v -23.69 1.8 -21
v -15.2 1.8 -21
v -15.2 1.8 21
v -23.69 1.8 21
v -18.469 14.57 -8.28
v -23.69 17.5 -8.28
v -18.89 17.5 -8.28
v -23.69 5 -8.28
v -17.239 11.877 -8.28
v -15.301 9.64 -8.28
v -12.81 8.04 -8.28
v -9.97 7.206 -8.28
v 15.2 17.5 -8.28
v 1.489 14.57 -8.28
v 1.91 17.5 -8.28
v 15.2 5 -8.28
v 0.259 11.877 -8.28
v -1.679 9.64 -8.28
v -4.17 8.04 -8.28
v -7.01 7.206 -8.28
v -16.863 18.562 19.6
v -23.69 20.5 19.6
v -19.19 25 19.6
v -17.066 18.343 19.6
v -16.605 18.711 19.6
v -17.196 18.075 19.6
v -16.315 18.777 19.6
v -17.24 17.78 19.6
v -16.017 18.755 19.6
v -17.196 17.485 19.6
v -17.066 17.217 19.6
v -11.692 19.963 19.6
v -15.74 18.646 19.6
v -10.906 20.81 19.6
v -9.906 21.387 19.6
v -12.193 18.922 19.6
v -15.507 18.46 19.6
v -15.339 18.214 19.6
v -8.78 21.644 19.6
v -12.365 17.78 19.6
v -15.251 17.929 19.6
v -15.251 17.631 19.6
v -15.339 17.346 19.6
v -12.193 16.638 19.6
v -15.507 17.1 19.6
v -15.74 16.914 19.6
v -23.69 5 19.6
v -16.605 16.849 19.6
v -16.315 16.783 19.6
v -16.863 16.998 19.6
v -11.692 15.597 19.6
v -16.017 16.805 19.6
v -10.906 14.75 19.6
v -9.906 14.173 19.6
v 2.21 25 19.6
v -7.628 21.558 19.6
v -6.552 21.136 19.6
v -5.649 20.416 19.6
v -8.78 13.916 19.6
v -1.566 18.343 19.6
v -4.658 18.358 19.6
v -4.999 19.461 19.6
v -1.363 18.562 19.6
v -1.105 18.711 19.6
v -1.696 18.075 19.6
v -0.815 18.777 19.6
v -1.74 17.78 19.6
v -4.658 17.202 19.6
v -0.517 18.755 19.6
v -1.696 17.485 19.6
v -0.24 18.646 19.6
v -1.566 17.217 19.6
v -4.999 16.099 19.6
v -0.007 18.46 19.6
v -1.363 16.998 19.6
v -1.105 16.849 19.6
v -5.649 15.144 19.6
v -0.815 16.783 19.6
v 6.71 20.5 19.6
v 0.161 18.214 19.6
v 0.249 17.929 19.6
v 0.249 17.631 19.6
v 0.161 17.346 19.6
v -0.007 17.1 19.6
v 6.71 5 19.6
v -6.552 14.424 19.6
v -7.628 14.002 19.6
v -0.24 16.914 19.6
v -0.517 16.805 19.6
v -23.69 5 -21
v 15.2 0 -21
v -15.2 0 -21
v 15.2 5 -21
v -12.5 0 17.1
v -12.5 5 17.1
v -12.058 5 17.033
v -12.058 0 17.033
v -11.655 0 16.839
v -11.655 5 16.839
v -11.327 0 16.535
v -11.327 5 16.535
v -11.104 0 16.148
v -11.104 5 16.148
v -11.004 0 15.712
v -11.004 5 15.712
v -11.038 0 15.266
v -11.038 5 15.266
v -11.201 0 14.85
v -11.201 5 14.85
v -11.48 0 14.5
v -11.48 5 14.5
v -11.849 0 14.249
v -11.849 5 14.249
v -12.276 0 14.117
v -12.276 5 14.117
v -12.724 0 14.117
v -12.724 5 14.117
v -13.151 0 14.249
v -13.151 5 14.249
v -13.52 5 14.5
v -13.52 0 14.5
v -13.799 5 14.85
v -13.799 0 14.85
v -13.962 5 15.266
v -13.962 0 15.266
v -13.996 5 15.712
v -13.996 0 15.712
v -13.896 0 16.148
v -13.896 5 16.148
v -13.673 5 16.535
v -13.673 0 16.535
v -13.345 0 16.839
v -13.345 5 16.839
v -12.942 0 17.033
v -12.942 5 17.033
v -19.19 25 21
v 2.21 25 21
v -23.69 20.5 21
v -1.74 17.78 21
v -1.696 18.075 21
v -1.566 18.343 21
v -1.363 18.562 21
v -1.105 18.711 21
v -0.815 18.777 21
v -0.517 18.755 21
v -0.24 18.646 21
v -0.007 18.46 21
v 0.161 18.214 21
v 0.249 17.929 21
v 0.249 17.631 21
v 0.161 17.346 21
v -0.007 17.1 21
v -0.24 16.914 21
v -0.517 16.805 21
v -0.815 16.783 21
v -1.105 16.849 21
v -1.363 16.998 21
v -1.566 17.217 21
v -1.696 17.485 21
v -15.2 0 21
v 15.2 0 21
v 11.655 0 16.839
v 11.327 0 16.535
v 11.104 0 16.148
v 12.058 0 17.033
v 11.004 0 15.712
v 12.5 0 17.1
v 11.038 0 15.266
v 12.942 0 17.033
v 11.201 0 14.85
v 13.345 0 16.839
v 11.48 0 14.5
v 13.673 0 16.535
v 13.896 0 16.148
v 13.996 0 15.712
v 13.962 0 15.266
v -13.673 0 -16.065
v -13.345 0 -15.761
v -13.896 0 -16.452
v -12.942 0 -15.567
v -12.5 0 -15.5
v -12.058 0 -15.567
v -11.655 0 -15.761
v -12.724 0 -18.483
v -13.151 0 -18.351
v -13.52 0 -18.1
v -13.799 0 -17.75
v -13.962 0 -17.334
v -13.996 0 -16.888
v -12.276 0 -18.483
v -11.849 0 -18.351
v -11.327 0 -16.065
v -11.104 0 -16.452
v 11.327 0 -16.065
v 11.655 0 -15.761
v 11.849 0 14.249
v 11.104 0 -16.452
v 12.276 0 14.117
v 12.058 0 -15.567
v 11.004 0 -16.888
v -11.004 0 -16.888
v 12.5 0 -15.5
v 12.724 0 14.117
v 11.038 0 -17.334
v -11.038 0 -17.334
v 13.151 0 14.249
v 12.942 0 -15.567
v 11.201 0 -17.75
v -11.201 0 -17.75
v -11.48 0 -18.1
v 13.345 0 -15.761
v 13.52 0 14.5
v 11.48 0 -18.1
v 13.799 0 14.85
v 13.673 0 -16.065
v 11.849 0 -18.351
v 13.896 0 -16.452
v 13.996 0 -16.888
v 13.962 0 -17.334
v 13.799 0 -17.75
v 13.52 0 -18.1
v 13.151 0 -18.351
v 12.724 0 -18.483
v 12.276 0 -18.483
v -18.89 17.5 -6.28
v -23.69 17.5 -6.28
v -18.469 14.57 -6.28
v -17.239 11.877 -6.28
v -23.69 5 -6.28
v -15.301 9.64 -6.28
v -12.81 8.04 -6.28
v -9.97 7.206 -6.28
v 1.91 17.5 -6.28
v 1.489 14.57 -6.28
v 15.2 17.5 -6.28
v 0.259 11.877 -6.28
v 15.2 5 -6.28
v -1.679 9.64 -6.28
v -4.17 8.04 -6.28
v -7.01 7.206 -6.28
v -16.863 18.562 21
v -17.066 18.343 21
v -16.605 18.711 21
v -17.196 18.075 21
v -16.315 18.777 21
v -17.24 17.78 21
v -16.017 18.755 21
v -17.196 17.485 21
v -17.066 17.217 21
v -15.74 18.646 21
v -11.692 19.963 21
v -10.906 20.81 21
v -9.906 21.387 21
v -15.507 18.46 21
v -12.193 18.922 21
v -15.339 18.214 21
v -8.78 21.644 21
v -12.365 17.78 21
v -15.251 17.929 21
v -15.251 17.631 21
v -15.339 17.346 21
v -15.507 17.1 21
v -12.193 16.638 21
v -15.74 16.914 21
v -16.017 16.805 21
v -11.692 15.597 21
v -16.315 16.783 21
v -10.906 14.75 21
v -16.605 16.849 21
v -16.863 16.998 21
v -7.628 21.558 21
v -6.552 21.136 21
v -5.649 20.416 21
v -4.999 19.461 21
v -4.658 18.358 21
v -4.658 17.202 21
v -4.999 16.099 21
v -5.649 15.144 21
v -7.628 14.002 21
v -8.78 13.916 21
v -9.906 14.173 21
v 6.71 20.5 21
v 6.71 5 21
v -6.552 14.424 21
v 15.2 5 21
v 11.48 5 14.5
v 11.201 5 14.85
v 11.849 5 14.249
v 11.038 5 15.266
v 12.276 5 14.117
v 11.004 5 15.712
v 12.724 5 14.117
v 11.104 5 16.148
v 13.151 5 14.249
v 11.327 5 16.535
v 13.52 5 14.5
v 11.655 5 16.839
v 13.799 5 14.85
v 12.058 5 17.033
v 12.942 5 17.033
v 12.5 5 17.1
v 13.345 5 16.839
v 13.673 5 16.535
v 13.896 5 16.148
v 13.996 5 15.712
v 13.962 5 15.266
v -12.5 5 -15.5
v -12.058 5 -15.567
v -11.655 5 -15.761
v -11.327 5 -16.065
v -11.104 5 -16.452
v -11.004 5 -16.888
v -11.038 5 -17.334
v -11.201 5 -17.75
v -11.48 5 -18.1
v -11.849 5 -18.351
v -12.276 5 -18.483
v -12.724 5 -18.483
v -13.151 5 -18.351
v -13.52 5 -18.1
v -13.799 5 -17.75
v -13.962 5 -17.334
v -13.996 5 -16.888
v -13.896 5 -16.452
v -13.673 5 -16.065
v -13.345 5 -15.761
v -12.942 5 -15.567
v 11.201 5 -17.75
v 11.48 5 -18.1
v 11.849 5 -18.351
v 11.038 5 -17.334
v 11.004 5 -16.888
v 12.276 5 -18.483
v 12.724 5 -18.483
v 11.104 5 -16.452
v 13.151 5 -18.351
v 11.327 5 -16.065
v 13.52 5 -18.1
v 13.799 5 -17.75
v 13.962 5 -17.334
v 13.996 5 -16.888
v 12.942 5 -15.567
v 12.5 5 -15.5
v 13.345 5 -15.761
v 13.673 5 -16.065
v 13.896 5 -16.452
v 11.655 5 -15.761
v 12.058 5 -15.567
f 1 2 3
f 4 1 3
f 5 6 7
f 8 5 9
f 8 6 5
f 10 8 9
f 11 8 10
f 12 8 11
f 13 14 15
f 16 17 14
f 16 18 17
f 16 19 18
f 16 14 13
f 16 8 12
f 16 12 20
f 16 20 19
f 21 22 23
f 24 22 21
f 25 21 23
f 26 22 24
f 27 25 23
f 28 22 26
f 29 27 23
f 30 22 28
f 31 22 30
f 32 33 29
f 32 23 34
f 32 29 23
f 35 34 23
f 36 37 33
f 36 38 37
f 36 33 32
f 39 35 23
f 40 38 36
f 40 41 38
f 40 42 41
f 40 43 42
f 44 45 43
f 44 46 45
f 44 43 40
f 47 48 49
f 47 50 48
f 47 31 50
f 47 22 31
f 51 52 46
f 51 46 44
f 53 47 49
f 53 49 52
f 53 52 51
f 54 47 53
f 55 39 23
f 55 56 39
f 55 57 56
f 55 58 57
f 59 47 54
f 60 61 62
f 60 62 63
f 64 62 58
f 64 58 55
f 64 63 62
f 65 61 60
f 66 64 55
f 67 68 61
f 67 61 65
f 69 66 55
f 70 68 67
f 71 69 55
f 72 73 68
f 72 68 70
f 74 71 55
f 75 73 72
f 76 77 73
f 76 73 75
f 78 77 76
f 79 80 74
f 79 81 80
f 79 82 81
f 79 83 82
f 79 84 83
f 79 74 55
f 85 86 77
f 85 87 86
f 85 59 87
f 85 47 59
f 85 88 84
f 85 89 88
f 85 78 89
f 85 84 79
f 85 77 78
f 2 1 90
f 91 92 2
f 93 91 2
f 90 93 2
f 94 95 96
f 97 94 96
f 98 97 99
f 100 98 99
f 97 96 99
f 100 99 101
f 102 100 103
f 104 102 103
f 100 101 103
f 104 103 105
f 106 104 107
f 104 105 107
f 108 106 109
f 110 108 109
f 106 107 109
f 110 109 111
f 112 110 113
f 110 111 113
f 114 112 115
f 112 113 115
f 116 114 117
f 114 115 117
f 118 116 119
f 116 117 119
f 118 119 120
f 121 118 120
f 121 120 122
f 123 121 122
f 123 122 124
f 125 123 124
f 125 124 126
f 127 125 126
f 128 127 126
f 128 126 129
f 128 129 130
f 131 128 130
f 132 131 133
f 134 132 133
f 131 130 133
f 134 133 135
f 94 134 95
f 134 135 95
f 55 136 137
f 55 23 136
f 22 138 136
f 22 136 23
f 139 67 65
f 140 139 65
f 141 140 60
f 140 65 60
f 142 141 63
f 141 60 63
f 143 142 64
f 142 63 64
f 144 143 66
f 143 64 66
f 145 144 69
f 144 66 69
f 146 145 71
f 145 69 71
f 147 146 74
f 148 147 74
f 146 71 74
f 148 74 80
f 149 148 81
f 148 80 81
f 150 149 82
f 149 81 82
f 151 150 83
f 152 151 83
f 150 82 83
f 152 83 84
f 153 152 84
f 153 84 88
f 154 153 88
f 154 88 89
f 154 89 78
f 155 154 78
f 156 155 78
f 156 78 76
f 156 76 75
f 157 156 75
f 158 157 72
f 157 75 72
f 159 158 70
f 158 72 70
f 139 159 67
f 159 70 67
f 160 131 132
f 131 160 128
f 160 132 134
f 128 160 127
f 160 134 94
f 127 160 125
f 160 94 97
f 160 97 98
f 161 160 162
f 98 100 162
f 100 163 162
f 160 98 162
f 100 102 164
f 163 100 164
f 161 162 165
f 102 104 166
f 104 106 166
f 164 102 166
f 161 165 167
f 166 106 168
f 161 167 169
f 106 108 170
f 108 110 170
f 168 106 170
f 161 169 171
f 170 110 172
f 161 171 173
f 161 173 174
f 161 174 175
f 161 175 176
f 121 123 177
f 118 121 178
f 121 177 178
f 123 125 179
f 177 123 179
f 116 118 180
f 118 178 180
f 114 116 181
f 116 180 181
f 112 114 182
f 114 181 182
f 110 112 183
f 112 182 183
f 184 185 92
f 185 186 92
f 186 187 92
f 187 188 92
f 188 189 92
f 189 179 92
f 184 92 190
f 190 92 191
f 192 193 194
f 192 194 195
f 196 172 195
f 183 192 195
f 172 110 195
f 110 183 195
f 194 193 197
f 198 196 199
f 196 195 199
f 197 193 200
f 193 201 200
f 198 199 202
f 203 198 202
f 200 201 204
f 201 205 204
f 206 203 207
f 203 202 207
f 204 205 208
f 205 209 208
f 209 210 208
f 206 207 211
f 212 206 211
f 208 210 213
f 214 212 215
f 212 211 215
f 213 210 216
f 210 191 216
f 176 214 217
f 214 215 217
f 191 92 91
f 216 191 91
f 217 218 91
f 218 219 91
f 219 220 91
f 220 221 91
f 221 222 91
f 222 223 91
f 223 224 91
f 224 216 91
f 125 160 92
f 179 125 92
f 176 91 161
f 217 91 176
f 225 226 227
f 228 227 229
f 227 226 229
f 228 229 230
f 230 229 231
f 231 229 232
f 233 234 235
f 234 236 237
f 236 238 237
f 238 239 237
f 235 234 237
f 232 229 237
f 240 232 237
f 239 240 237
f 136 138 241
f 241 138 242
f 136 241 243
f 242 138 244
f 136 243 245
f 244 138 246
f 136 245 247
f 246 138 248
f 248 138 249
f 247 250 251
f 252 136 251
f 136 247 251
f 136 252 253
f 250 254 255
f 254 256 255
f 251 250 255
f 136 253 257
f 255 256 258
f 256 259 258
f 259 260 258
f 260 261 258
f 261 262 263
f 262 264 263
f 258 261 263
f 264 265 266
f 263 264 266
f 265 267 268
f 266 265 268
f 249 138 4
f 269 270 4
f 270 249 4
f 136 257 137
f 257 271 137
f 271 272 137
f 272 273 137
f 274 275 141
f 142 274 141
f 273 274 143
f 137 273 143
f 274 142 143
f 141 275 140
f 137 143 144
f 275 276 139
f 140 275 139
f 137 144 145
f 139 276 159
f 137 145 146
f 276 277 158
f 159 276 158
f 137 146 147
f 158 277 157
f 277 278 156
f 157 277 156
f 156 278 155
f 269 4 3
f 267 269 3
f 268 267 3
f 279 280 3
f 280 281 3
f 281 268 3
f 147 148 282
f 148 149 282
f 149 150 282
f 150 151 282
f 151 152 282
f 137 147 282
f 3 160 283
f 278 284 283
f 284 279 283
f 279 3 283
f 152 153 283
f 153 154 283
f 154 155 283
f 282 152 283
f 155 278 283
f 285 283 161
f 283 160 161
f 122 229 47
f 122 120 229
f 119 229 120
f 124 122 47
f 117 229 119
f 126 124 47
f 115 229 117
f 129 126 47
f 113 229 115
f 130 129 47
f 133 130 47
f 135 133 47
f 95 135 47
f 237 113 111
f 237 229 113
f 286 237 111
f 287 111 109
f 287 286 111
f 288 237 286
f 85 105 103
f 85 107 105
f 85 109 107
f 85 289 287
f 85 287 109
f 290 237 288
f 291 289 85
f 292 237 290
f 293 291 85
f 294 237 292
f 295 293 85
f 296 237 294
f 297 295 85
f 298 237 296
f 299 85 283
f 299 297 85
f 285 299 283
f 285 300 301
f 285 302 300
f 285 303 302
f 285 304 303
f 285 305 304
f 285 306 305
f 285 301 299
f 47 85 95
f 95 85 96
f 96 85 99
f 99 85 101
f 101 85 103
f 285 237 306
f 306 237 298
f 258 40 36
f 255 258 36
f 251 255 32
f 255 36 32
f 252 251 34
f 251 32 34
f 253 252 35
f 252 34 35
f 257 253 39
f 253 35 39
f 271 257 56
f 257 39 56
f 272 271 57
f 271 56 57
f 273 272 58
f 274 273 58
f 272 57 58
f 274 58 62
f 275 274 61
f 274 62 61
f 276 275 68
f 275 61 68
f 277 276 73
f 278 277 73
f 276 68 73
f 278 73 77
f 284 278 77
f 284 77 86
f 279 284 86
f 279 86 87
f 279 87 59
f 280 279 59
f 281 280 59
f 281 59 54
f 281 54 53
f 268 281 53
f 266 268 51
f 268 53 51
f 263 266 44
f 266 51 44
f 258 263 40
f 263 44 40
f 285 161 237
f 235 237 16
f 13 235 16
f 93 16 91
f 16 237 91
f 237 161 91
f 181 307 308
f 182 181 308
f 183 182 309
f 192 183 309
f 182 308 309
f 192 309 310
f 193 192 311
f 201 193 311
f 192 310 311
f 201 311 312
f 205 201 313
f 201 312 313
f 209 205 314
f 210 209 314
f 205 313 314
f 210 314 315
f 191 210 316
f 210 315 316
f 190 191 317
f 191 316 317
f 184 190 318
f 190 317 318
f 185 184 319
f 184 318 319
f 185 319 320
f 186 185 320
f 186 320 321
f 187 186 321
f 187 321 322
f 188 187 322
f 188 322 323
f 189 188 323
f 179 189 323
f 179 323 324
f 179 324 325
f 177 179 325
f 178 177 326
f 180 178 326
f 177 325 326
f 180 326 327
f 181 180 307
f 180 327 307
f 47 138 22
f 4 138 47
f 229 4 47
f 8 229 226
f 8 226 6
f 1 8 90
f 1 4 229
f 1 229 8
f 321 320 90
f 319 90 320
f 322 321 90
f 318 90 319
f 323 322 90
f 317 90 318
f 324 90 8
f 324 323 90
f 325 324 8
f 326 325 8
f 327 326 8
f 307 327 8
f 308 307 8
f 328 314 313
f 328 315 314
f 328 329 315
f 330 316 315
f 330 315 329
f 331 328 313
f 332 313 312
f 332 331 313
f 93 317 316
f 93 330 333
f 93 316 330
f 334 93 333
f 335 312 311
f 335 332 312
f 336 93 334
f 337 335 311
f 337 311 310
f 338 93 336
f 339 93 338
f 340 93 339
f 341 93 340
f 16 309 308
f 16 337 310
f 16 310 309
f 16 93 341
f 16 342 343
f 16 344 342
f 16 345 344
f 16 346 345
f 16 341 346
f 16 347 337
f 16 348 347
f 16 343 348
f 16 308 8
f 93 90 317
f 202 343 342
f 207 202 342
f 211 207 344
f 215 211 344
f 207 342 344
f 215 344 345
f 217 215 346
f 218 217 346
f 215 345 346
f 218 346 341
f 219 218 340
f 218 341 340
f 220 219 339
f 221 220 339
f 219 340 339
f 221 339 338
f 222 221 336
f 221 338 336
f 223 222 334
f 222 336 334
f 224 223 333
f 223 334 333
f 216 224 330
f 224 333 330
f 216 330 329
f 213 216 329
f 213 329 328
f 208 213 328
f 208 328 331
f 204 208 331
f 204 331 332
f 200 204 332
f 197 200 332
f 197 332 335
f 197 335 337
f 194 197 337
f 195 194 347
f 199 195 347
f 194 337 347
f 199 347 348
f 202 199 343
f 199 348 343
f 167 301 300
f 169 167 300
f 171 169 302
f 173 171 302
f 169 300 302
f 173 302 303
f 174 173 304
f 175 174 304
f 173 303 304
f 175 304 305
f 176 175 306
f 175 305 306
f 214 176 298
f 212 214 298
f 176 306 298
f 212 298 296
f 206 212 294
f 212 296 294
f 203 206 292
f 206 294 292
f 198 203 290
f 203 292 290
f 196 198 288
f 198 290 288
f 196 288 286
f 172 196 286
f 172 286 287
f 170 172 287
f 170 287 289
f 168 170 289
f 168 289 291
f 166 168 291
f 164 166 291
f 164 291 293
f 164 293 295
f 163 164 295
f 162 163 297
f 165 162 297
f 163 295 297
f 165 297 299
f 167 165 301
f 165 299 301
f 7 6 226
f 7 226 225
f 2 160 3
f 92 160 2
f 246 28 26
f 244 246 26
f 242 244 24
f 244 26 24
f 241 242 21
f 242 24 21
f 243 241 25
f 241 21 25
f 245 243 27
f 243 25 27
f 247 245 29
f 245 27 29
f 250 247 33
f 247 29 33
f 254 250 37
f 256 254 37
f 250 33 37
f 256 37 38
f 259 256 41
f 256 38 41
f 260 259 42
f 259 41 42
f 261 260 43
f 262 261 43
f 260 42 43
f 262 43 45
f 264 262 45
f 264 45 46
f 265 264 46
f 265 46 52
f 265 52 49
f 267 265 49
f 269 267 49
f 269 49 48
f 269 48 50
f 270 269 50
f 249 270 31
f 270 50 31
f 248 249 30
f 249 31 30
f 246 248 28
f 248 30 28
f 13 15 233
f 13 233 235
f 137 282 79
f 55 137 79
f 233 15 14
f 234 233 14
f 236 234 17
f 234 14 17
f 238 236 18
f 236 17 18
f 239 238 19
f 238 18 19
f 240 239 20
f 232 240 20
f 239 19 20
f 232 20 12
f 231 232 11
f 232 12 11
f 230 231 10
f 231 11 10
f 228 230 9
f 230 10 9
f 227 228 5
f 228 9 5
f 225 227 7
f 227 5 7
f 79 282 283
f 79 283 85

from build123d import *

# Parameters (mm, degrees)
SKETCH1_W           = 30.4
SKETCH1_H           = 42
BOSS_EXTRUDE1_DEPTH = 5
SKETCH2_W           = 42
SKETCH2_H           = 3.2
BOSS_EXTRUDE2_DEPTH = 8.49
SKETCH4_W           = 30.4
SKETCH4_H           = 1.4
BOSS_EXTRUDE3_DEPTH = 20
SKETCH5_R           = 3.875
SKETCH5_R_2         = 1
CUT_EXTRUDE1_DEPTH  = 1.4
CHAMFER1_SIZE       = 4.5
SKETCH6_R           = 1.5
CUT_EXTRUDE2_DEPTH  = 5
SKETCH7_W           = 38.89
SKETCH7_H           = 2
BOSS_EXTRUDE4_DEPTH = 12.5
SKETCH8_R           = 10.4
CUT_EXTRUDE3_DEPTH  = 2


with BuildPart() as part:
    # Sketch1 → Boss-Extrude1 (new body)
    with BuildSketch(Plane(origin=(0, 0, 0), x_dir=(1, 0, 0), z_dir=(0, 1, 0))):
        Rectangle(SKETCH1_W, SKETCH1_H)
    extrude(amount=BOSS_EXTRUDE1_DEPTH)

    # Sketch2 → Boss-Extrude2 (add)
    with BuildSketch(Plane.ZY.offset(15.2)):
        with Locations((0, 3.4)):
            Rectangle(SKETCH2_W, SKETCH2_H)
    extrude(amount=BOSS_EXTRUDE2_DEPTH)

    # Sketch4 → Boss-Extrude3 (add)
    with BuildSketch(Plane(origin=(0, 5, 0), x_dir=(1, 0, 0), z_dir=(0, 1, 0))):
        with Locations((-8.49, -20.3)):
            Rectangle(SKETCH4_W, SKETCH4_H)
    extrude(amount=BOSS_EXTRUDE3_DEPTH)

    # Sketch5 → Cut-Extrude1 (cut)
    with BuildSketch(Plane(origin=(0, 0, 19.6), x_dir=(-1, 0, 0), z_dir=(0, 0, -1))):
        with Locations((8.49, 17.78)):
            Circle(SKETCH5_R)
        with Locations((0.74, 17.78)):
            Circle(SKETCH5_R_2)
        with Locations((16.24, 17.78)):
            Circle(SKETCH5_R_2)
    extrude(amount=-CUT_EXTRUDE1_DEPTH, mode=Mode.SUBTRACT)

    # Chamfer1
    chamfer1_edges = [part.edges().sort_by_distance(p)[0] for p in [
        (-23.69, 25, 20.3),
        (6.71, 25, 20.3),
    ]]
    chamfer(chamfer1_edges, length=CHAMFER1_SIZE)

    # Sketch6 → Cut-Extrude2 (cut)
    with BuildSketch(Plane(origin=(0, 5, 0), x_dir=(1, 0, 0), z_dir=(0, 1, 0))):
        with Locations(Location((12.5, -15.6, 0), (0, 0, 270))):
            Circle(SKETCH6_R)
        with Locations(Location((12.5, 17, 0), (0, 0, 270))):
            Circle(SKETCH6_R)
        with Locations(Location((-12.5, 17, 0), (0, 0, 270))):
            Circle(SKETCH6_R)
        with Locations(Location((-12.5, -15.6, 0), (0, 0, 270))):
            Circle(SKETCH6_R)
    extrude(amount=-CUT_EXTRUDE2_DEPTH, mode=Mode.SUBTRACT)

    # Sketch7 → Boss-Extrude4 (add)
    with BuildSketch(Plane(origin=(0, 5, 0), x_dir=(1, 0, 0), z_dir=(0, 1, 0))):
        with Locations((-4.245, 7.28)):
            Rectangle(SKETCH7_W, SKETCH7_H)
    extrude(amount=BOSS_EXTRUDE4_DEPTH)

    # Sketch8 → Cut-Extrude3 (cut)
    with BuildSketch(Plane(origin=(0, 0, -8.28), x_dir=(-1, 0, 0), z_dir=(0, 0, -1))):
        with Locations((8.49, 17.5)):
            Circle(SKETCH8_R)
    extrude(amount=-CUT_EXTRUDE3_DEPTH, mode=Mode.SUBTRACT)


solid = part.part
